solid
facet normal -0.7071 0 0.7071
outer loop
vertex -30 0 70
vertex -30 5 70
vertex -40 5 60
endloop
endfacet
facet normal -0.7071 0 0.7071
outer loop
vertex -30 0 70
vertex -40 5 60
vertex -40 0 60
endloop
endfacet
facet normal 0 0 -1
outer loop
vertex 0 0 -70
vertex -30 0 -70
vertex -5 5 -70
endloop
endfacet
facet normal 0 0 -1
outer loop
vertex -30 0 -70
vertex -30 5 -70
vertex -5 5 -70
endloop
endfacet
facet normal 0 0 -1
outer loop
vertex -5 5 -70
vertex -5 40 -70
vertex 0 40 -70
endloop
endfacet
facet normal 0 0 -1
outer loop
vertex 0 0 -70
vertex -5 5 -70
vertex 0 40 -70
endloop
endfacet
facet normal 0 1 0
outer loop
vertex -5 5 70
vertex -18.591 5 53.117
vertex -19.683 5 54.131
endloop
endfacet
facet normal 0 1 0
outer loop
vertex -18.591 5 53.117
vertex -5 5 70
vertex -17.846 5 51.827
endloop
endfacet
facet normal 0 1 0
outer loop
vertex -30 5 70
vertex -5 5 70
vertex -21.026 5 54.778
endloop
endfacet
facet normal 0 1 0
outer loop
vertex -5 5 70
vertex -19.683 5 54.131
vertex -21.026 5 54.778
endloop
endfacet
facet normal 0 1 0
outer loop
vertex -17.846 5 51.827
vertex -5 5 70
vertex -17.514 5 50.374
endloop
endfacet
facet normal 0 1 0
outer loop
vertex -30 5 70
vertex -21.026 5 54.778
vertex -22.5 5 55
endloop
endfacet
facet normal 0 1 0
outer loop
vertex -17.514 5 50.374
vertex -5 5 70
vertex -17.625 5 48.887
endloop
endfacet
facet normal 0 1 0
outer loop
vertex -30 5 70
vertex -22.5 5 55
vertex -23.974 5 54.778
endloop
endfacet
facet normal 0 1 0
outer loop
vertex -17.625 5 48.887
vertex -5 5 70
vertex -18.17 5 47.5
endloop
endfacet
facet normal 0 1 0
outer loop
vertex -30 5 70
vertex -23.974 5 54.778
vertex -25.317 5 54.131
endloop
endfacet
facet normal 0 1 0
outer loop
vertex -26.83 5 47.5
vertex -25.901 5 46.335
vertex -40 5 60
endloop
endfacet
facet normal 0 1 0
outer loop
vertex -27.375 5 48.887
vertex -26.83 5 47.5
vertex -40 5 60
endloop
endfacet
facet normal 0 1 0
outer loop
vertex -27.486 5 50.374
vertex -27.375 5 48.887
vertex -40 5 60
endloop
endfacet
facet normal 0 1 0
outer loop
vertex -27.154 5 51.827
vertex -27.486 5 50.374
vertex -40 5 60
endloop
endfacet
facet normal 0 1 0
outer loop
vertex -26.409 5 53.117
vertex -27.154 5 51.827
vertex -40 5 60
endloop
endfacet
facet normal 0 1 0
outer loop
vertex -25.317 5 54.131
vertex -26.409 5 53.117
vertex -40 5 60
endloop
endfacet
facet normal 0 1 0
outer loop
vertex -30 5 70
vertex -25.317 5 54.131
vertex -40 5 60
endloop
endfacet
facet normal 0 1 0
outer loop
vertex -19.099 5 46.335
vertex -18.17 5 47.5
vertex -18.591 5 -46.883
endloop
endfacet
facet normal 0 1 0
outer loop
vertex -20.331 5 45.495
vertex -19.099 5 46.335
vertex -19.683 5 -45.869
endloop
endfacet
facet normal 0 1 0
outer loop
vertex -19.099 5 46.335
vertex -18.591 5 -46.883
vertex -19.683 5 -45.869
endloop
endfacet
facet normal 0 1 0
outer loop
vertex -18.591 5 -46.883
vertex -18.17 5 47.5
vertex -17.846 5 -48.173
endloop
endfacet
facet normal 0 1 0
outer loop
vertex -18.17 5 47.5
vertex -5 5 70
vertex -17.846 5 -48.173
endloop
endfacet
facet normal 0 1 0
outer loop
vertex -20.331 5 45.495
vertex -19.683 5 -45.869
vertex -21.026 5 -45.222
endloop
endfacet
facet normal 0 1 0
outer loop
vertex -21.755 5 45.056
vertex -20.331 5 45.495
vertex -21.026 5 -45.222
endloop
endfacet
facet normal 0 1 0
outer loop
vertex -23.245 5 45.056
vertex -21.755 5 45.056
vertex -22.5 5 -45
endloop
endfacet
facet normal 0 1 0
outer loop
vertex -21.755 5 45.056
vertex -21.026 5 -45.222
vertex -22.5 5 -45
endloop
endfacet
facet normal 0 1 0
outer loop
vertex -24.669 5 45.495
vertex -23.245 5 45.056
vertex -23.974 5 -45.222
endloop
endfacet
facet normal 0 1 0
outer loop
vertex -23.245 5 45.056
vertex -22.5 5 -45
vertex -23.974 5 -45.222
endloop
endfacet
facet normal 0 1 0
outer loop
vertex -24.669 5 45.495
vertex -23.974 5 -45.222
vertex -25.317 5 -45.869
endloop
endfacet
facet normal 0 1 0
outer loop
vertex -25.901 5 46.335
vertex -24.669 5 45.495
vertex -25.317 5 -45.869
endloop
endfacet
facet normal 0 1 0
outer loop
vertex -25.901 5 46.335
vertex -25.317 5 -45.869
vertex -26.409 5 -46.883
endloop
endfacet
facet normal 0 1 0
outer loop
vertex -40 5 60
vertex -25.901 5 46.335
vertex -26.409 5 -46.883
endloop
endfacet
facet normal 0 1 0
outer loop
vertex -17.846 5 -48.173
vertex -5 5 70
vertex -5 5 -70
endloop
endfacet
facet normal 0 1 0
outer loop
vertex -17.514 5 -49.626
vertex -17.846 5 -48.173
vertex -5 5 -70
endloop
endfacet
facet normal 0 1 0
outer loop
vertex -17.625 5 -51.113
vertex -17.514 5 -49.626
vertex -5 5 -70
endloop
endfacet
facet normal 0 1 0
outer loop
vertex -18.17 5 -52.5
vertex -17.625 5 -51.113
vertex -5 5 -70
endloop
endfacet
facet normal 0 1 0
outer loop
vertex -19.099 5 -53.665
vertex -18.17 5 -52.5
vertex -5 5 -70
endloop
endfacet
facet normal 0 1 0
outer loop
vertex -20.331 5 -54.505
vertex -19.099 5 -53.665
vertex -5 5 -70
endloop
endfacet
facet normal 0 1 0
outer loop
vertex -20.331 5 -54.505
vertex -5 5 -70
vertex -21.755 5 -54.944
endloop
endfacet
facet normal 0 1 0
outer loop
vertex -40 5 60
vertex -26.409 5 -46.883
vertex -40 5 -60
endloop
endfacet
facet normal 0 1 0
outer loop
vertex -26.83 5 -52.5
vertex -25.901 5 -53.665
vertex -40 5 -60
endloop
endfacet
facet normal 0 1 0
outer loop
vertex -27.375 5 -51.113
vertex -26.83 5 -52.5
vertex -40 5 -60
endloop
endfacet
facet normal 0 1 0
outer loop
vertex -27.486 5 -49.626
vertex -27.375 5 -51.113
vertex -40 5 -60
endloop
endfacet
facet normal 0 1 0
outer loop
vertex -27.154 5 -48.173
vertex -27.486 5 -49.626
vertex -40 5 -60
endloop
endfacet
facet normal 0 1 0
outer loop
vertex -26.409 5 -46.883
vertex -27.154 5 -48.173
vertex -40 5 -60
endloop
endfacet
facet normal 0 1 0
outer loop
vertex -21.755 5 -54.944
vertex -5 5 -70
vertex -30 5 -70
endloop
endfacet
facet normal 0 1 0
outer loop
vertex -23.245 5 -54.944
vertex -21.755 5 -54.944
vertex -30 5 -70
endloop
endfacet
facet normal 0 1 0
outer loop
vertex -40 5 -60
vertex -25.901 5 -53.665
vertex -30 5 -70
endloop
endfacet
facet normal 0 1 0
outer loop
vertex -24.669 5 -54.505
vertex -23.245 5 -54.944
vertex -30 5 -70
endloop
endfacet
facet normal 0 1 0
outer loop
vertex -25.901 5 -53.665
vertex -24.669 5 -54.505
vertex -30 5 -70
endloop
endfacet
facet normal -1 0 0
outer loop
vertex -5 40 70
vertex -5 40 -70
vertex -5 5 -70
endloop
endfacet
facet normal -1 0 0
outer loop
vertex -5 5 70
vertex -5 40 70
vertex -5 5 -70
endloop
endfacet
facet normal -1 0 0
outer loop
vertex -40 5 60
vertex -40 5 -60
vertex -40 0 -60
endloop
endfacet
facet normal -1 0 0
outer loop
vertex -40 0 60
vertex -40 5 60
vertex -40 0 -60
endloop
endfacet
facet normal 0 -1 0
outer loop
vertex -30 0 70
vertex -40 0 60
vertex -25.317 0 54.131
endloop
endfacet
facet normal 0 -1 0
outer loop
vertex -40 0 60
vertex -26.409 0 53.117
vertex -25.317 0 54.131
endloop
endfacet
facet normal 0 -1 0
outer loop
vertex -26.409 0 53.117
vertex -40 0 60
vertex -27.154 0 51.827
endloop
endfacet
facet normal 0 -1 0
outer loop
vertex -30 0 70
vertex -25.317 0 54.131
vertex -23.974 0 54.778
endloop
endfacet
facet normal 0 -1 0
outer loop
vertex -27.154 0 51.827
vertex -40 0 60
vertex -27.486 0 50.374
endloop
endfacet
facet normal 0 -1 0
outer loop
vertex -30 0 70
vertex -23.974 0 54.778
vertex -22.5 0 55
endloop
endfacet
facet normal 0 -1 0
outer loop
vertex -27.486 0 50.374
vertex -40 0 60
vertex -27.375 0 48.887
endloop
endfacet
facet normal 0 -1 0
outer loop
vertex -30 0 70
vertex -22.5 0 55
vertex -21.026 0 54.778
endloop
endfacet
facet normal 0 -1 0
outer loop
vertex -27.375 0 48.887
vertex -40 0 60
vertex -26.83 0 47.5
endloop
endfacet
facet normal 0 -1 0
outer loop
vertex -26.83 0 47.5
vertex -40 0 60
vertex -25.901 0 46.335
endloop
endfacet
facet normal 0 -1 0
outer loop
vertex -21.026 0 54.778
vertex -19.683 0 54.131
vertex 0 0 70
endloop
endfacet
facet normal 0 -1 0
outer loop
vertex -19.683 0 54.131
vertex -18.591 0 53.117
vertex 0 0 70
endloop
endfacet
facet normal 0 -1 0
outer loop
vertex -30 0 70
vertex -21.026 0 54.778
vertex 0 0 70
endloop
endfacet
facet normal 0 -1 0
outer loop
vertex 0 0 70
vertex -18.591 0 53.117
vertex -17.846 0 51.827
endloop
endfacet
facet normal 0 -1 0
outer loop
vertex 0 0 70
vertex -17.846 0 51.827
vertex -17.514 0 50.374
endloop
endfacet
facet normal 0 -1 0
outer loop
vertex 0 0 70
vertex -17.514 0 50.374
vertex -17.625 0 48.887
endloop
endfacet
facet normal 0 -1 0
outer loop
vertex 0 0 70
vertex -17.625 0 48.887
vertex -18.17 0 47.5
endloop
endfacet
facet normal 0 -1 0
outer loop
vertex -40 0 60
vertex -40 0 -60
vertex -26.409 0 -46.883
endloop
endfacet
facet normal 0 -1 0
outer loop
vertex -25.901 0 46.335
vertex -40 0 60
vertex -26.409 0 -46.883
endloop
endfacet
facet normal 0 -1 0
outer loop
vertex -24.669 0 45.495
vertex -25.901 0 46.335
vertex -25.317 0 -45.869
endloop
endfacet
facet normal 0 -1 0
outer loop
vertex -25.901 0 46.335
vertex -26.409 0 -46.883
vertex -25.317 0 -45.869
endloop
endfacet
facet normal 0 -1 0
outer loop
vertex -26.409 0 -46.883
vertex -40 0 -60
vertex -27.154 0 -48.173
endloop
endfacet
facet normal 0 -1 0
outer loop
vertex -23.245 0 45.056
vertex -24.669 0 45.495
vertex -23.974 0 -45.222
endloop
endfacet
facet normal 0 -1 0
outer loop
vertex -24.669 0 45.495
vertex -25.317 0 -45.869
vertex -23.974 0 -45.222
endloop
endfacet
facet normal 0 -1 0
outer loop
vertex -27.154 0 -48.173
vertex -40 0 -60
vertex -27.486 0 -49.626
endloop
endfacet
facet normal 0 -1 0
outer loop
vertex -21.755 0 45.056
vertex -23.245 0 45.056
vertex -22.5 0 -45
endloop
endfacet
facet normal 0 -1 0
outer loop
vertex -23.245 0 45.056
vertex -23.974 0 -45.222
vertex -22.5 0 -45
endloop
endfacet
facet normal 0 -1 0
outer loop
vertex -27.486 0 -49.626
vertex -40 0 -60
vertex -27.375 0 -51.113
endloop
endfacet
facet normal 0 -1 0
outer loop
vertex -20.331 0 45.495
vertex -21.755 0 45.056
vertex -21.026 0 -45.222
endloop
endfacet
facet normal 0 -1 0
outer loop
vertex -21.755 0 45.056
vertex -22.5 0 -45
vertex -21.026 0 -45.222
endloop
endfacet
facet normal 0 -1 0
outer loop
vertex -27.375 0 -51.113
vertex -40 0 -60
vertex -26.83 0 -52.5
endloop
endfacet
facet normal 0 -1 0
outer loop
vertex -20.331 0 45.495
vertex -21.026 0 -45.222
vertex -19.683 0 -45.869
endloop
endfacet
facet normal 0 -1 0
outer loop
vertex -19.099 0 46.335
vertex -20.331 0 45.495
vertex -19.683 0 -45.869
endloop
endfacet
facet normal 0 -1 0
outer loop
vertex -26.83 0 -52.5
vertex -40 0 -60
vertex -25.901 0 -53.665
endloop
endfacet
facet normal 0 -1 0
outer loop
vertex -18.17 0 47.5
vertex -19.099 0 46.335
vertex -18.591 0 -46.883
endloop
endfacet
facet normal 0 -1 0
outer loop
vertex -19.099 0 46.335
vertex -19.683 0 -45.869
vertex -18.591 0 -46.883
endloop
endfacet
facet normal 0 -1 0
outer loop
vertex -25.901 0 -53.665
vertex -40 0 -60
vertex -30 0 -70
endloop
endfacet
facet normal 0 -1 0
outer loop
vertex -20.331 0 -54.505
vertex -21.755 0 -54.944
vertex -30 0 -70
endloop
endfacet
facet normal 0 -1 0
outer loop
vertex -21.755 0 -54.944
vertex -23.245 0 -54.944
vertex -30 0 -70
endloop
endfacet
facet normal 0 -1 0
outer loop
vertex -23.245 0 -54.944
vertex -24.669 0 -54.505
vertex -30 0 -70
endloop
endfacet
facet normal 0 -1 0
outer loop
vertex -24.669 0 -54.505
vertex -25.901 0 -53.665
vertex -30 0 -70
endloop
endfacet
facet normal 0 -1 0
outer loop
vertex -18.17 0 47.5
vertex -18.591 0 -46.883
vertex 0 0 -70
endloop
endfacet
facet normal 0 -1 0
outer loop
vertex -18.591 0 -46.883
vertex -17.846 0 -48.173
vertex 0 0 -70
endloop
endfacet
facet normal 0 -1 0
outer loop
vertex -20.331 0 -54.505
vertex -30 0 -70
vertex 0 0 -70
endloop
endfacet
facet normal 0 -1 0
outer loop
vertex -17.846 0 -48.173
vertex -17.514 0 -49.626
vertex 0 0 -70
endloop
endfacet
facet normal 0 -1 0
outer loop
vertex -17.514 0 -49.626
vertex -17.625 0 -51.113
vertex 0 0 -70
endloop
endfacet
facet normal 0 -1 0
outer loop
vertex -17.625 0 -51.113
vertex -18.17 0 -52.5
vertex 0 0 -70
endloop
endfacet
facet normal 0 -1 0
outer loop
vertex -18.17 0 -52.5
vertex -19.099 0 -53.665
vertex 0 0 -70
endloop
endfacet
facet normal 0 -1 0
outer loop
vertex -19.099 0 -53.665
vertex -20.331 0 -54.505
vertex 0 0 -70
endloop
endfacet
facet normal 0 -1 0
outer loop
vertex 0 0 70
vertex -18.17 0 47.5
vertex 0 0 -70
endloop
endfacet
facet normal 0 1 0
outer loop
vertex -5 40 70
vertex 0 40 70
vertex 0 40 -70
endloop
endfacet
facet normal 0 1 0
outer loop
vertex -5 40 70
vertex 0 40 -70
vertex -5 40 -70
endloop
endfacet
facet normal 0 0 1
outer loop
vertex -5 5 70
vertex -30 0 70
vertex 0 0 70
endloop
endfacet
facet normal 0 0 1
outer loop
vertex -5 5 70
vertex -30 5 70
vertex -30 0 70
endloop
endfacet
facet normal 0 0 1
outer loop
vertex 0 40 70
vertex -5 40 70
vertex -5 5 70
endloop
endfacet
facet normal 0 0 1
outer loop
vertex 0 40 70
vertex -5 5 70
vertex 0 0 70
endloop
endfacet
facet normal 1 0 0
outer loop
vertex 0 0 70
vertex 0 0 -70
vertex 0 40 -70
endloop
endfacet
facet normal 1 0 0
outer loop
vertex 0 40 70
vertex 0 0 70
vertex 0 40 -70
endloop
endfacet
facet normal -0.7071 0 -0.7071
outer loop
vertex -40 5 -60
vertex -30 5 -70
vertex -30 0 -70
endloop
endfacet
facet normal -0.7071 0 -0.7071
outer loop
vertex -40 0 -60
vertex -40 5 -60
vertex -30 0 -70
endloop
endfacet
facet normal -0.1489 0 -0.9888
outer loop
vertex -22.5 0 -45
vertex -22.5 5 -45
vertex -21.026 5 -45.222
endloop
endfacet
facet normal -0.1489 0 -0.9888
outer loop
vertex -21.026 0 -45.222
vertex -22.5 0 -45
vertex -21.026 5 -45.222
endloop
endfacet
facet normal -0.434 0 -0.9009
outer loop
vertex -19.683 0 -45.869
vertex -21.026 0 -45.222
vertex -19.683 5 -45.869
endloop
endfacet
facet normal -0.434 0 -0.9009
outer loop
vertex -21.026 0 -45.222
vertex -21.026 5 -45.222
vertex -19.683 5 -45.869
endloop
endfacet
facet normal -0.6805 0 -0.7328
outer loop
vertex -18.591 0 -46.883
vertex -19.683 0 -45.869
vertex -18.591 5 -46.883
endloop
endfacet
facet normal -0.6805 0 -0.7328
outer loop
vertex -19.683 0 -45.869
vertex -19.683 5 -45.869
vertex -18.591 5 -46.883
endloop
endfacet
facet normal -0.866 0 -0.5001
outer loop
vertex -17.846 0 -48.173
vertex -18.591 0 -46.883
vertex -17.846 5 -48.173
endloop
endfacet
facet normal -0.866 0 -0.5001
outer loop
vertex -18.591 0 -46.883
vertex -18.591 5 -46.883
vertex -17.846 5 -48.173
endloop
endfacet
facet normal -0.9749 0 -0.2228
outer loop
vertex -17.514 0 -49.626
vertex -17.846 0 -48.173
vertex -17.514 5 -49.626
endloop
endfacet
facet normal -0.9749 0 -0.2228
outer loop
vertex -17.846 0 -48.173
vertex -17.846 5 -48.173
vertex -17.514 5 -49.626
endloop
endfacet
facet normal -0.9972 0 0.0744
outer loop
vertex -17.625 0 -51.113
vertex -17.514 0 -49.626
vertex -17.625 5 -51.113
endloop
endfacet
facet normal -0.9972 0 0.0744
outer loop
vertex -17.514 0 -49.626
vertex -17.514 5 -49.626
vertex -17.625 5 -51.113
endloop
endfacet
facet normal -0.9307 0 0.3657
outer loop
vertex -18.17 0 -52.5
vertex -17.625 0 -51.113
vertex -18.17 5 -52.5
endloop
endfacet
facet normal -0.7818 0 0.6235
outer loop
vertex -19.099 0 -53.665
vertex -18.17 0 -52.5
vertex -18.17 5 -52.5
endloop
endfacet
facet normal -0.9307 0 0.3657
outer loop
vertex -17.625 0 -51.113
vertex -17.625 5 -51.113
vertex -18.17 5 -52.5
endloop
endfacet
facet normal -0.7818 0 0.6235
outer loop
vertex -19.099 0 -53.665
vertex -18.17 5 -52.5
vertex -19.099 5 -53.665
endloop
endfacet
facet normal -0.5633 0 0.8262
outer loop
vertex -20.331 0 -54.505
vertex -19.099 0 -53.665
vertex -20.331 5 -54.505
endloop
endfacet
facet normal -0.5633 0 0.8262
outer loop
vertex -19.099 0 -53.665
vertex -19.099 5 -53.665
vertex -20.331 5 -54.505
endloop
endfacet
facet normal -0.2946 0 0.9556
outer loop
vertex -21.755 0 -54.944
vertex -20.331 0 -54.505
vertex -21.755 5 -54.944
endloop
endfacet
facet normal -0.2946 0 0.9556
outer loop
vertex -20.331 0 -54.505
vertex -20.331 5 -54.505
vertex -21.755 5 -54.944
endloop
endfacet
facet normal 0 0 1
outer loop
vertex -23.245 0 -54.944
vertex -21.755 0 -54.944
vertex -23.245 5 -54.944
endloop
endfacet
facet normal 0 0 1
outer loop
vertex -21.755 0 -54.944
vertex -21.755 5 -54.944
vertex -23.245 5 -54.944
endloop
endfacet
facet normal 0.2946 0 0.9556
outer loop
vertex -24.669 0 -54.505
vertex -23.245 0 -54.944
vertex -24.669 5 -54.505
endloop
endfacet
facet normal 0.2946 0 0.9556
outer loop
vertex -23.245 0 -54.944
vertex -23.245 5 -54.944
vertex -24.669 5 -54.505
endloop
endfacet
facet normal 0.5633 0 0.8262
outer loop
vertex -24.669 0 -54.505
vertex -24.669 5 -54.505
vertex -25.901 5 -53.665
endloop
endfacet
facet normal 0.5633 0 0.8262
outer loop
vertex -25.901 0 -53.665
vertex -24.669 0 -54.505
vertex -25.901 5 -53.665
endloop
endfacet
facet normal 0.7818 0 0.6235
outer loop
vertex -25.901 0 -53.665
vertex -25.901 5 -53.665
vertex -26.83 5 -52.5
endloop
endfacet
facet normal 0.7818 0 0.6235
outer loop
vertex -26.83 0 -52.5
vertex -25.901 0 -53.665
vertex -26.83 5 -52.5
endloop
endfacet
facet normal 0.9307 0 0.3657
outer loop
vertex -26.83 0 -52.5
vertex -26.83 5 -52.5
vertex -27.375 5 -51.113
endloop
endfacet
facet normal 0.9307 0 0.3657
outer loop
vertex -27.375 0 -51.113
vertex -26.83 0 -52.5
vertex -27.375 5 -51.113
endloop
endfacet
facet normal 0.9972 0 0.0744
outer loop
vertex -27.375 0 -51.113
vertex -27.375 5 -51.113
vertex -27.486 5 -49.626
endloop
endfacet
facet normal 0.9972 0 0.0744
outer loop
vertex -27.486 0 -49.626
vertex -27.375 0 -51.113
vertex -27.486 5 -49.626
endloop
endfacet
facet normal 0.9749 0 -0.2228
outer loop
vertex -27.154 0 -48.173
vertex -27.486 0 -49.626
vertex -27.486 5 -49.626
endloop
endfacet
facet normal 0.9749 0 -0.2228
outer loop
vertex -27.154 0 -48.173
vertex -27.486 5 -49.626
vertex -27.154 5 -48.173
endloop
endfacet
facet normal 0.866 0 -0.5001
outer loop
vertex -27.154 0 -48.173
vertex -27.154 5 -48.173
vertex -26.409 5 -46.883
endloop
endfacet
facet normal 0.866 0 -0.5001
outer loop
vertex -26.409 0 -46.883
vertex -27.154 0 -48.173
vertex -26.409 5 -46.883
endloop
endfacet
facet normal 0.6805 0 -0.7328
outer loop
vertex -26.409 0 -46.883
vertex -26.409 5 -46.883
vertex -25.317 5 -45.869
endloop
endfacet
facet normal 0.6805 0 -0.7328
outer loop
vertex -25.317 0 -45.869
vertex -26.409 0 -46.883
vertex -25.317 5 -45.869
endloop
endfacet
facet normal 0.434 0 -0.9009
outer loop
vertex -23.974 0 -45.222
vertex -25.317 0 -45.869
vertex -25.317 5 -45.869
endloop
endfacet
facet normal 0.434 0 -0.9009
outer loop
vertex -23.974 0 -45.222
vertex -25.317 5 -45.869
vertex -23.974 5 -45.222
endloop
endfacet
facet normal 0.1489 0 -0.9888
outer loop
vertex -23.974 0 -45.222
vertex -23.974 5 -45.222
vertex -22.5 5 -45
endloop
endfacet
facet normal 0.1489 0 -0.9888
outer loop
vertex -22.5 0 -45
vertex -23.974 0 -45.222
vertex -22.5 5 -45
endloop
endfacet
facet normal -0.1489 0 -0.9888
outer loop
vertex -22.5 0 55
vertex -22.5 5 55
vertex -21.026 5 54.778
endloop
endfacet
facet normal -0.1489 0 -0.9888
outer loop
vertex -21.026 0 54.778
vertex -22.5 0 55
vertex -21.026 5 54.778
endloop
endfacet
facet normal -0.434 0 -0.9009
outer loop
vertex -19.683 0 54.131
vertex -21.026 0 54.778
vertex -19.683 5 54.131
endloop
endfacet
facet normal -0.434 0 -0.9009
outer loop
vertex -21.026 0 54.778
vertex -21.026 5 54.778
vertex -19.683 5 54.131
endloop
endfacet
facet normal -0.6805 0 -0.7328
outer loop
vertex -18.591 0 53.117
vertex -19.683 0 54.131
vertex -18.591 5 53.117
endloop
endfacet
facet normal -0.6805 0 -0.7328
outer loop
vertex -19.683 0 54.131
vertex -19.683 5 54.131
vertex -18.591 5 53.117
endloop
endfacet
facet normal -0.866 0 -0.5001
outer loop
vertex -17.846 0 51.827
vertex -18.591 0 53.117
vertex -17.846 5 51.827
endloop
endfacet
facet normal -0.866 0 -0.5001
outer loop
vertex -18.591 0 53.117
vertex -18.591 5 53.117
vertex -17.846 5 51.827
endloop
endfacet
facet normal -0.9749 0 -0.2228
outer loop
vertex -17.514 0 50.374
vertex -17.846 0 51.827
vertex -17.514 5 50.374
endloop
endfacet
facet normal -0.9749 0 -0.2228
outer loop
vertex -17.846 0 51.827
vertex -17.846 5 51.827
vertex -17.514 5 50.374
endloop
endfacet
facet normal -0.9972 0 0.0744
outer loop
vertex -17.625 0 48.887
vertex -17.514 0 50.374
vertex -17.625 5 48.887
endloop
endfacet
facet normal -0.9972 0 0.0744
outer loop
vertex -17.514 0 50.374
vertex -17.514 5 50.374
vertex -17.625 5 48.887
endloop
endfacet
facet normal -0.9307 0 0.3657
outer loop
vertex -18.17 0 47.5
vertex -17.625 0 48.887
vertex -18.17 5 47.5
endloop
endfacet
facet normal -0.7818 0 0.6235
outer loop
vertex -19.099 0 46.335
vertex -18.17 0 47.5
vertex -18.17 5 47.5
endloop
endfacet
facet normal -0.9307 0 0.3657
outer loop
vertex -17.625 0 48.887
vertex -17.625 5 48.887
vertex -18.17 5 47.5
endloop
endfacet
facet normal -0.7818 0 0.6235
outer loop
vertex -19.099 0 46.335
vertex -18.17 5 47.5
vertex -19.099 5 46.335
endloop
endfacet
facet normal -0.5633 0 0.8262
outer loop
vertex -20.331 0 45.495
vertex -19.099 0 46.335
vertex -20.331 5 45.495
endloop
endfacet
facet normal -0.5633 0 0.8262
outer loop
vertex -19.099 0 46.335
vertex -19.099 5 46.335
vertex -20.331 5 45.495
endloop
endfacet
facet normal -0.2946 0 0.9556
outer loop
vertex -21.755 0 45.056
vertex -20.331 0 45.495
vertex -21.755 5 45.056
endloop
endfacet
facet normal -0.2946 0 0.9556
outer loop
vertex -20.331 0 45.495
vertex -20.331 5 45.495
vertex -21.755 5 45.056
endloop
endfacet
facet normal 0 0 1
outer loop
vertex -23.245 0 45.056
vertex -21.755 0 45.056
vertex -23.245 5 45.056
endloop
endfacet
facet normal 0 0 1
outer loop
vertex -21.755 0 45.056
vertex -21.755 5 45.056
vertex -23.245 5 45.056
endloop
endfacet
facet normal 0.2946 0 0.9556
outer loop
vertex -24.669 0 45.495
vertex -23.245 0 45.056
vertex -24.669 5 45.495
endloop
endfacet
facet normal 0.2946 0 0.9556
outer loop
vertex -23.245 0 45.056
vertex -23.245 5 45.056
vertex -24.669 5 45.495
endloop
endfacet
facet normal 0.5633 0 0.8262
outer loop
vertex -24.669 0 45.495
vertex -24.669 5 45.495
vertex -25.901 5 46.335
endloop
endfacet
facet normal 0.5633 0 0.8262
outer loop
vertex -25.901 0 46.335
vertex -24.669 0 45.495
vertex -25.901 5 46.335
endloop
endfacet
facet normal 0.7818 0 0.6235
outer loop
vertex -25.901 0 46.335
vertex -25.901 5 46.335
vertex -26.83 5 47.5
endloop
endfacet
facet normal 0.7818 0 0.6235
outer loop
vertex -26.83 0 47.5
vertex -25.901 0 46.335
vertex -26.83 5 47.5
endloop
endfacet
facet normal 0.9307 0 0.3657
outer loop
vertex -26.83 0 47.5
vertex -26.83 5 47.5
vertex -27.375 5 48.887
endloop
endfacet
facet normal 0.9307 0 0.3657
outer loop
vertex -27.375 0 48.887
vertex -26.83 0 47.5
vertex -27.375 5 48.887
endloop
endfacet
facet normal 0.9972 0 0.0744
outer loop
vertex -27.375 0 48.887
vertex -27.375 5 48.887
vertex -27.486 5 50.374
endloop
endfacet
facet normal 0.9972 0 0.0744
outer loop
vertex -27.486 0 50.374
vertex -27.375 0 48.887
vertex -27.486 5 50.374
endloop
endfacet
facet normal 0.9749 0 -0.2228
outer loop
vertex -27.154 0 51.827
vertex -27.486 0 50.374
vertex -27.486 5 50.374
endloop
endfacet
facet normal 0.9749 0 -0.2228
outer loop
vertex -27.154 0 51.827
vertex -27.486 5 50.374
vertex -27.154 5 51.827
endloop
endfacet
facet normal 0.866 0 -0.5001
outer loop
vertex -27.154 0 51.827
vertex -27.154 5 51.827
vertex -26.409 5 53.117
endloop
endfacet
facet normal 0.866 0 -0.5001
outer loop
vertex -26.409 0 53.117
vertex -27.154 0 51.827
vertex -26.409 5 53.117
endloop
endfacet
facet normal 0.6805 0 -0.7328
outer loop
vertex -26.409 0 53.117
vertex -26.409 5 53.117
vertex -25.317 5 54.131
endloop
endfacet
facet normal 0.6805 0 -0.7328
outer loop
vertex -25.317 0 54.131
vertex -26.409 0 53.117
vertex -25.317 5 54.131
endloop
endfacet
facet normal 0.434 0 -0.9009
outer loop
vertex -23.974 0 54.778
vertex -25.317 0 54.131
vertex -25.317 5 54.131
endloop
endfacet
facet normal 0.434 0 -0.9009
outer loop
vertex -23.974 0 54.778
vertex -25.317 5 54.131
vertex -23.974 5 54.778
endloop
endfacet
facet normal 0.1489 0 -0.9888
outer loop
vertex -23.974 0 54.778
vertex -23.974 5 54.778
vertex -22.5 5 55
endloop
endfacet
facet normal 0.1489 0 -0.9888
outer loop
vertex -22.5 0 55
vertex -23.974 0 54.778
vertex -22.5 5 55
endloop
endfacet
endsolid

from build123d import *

# Parameters (mm, degrees)
EXTRUDE_THIN1_DEPTH      = 70
EXTRUDE_THIN1_DEPTH_BACK = 70
CHAMFER1_SIZE            = 10
SKETCH2_R                = 5
CUT_EXTRUDE1_DEPTH       = 10


with BuildPart() as part:
    # Sketch1 → Extrude-Thin1 (new, two sides: drawn at the far end of the back side and taken through both)
    with BuildSketch(Plane.XY.offset(-EXTRUDE_THIN1_DEPTH_BACK)):
        Polygon((-40, 0), (0, 0), (0, 40), (-5, 40), (-5, 5), (-40, 5), align=None)
    extrude(amount=EXTRUDE_THIN1_DEPTH + EXTRUDE_THIN1_DEPTH_BACK)

    # Chamfer1
    chamfer1_edges = [part.edges().sort_by_distance(p)[0] for p in [
        (-40, 2.5, 70),
        (-40, 2.5, -70),
    ]]
    chamfer(chamfer1_edges, length=CHAMFER1_SIZE)

    # Sketch2 → Cut-Extrude1 (cut)
    with BuildSketch(Plane(origin=(0, 5, 0), x_dir=(1, 0, 0), z_dir=(0, 1, 0))):
        with Locations(Location((-22.5, 50, 0), (0, 0, 270))):
            Circle(SKETCH2_R)
        with Locations(Location((-22.5, -50, 0), (0, 0, 270))):
            Circle(SKETCH2_R)
    extrude(amount=-CUT_EXTRUDE1_DEPTH, mode=Mode.SUBTRACT)


solid = part.part
